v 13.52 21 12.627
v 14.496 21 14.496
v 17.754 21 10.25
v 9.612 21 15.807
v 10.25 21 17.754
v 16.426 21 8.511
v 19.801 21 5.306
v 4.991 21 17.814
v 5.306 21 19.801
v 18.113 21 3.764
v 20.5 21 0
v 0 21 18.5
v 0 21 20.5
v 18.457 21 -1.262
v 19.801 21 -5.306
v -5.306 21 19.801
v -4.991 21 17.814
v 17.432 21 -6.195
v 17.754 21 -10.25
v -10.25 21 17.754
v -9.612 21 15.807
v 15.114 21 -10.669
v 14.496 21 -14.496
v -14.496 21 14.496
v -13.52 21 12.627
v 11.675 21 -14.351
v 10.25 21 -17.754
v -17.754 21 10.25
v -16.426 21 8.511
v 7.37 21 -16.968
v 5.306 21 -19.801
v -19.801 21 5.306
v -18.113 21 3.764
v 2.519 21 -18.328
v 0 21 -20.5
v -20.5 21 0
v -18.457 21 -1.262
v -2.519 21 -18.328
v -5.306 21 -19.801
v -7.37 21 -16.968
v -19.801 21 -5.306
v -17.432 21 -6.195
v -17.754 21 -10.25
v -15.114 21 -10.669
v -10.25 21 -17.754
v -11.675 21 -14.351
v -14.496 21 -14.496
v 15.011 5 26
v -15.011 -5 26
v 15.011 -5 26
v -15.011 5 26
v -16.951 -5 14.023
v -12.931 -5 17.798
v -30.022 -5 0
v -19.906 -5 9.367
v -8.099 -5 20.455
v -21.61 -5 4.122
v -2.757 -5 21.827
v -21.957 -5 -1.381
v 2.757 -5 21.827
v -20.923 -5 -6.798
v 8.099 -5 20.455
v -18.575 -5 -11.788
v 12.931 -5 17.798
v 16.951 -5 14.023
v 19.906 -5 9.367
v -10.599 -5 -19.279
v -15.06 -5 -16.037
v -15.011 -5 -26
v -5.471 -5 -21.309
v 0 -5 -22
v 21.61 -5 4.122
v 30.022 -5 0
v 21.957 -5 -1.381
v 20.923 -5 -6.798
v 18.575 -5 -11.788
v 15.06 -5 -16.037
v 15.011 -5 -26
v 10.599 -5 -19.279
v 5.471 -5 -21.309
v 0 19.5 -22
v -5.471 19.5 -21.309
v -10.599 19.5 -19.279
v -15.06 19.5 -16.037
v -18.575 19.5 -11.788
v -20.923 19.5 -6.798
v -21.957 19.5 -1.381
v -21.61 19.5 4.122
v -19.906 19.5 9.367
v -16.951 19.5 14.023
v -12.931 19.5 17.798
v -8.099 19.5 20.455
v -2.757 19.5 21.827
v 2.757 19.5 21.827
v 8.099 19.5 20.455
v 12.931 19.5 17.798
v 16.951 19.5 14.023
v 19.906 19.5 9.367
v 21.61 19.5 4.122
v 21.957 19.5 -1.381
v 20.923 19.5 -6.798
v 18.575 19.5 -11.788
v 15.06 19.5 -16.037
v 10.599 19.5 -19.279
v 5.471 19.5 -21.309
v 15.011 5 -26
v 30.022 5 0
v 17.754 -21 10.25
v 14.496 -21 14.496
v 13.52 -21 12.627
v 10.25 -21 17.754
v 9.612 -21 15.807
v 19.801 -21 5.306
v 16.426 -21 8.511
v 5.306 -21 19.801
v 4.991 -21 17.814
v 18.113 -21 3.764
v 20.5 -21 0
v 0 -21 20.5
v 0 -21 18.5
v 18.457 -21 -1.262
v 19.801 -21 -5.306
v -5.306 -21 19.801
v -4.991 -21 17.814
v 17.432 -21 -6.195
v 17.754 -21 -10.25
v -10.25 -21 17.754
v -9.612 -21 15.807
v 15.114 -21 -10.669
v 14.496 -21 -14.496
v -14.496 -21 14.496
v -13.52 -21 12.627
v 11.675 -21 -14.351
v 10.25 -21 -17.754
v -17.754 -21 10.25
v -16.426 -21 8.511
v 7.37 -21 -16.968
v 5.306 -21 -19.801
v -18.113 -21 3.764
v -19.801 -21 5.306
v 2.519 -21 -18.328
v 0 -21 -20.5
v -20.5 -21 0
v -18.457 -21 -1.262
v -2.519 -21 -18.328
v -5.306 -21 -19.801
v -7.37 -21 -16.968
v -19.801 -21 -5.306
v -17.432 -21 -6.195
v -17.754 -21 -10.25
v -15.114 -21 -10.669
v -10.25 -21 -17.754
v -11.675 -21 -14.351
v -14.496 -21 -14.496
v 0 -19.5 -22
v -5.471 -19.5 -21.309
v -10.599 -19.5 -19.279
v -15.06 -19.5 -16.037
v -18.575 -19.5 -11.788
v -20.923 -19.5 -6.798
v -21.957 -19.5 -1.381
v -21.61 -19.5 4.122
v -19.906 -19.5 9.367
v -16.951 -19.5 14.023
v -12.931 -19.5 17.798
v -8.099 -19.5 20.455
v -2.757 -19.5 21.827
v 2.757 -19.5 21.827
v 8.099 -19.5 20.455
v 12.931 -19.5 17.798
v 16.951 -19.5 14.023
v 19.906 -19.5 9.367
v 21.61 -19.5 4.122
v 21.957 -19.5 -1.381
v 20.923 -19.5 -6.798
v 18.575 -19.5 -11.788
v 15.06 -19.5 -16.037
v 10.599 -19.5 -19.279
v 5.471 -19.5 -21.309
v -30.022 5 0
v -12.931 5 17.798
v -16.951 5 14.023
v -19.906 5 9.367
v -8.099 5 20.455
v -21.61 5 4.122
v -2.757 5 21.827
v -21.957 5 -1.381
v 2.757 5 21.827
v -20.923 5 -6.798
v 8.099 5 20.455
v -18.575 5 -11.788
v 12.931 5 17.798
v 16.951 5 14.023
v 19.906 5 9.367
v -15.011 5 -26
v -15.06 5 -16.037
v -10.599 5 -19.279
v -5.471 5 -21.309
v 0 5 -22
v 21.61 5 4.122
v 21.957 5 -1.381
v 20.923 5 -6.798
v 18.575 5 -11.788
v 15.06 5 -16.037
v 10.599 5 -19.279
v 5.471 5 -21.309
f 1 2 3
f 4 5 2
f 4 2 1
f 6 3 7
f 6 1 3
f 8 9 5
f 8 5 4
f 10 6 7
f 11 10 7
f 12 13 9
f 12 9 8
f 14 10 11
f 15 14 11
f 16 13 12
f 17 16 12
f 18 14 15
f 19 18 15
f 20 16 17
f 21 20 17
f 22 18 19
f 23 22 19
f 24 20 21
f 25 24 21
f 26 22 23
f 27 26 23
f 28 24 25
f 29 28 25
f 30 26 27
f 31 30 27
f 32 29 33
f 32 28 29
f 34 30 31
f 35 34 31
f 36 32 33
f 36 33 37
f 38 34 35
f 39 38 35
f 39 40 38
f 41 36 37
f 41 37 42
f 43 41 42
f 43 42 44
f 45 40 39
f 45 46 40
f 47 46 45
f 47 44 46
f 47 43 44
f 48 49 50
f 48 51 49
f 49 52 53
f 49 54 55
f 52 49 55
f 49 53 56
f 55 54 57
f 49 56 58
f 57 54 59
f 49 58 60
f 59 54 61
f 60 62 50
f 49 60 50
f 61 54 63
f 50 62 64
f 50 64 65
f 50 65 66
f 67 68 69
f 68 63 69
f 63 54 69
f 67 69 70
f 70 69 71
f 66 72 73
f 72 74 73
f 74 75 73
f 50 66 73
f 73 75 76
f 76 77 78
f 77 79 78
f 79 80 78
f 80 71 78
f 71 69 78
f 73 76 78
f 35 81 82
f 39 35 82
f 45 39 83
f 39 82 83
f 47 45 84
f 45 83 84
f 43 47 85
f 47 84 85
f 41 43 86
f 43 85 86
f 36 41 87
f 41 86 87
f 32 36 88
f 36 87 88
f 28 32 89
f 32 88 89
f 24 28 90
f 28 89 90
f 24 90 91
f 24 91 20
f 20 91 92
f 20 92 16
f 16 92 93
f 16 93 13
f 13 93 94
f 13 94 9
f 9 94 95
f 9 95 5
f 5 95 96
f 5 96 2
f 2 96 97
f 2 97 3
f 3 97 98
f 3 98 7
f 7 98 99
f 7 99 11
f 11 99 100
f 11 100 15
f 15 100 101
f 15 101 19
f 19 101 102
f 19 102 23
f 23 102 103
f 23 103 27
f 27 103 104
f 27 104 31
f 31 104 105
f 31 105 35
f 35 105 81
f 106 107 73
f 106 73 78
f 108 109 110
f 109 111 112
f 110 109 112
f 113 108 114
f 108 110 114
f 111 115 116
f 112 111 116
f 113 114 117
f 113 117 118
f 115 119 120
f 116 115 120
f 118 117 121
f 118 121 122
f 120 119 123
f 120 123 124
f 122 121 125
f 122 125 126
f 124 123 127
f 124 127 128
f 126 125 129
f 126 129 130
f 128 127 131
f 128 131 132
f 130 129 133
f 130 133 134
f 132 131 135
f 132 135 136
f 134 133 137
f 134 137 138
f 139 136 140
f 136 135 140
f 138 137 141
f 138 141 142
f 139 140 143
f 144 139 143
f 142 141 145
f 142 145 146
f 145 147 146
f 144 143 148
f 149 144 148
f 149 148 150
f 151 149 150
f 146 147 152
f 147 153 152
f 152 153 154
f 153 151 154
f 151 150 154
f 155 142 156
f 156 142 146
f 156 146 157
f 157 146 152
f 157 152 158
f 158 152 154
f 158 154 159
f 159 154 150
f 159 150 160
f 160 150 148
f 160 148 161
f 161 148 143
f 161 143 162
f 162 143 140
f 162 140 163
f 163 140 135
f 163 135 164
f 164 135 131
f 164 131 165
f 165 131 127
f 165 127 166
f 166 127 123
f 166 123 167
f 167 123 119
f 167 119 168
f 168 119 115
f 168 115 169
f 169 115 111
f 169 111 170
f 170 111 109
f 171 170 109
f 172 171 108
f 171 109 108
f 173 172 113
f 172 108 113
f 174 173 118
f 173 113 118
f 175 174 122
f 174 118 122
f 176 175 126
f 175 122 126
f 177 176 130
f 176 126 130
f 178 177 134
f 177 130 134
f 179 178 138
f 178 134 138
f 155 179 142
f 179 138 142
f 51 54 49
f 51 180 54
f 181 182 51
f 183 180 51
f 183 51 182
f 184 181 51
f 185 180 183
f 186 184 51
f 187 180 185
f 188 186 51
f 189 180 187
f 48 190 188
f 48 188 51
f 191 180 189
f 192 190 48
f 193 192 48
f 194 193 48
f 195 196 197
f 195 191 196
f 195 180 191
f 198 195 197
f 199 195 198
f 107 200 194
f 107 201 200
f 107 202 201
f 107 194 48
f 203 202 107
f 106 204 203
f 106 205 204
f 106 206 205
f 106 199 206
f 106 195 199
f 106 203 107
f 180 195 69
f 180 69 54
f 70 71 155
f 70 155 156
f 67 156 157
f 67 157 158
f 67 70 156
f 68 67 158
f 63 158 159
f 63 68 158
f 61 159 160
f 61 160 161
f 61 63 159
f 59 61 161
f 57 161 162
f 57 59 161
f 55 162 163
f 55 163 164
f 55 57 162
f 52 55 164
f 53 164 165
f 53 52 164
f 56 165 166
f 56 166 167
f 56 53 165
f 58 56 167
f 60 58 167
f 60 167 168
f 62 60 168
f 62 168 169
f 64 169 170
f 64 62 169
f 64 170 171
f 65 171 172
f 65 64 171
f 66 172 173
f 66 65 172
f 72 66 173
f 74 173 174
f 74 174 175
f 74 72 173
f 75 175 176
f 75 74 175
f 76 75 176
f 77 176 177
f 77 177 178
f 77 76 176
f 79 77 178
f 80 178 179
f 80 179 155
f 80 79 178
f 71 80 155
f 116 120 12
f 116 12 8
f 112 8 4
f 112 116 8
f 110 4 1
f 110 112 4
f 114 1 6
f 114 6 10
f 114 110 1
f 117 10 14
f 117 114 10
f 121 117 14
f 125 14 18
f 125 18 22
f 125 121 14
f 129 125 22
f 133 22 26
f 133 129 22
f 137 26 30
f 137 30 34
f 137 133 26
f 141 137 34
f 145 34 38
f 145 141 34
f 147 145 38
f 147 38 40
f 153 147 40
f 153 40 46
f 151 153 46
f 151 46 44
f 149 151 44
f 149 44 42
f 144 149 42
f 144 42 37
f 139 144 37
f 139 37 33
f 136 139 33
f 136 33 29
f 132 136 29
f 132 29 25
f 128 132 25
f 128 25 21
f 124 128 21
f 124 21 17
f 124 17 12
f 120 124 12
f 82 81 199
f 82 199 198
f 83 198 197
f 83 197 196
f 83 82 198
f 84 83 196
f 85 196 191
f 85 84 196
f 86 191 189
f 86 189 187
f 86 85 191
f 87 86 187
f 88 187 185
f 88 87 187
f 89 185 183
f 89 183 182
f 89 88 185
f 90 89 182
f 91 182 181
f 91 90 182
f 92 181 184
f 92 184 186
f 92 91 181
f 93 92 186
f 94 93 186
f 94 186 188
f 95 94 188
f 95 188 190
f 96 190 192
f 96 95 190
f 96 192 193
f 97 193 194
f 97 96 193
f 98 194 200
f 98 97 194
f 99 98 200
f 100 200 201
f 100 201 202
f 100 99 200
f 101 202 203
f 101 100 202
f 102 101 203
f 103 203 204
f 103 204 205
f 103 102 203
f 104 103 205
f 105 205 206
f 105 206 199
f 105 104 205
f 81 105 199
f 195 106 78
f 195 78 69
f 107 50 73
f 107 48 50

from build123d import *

# Parameters (mm, degrees)
SKETCH1_R           = 18.5
BOSS_EXTRUDE1_DEPTH = 5
SKETCH2_R           = 22
SKETCH2_R_2         = 18.5
BOSS_EXTRUDE2_DEPTH = 21
CHAMFER1_SIZE       = 1.5


with BuildPart() as part:
    # Sketch1 → Boss-Extrude1 (new, symmetric)
    with BuildSketch(Plane(origin=(0, 0, 0), x_dir=(1, 0, 0), z_dir=(0, 1, 0))):
        Polygon((15.011106999, -26), (30.022213998, 0), (15.011106999, 26), (-15.011106999, 26), (-30.022213998, 0), (-15.011106999, -26), align=None)
        with Locations(Location((0, 0, 0), (0, 0, 270))):
            Circle(SKETCH1_R, mode=Mode.SUBTRACT)
    extrude(amount=BOSS_EXTRUDE1_DEPTH, both=True)

    # Sketch2 → Boss-Extrude2 (add, symmetric)
    with BuildSketch(Plane(origin=(0, 0, 0), x_dir=(1, 0, 0), z_dir=(0, 1, 0))):
        with Locations(Location((0, 0, 0), (0, 0, 90))):
            Circle(SKETCH2_R)
        with Locations(Location((0, 0, 0), (0, 0, 270))):
            Circle(SKETCH2_R_2, mode=Mode.SUBTRACT)
    extrude(amount=BOSS_EXTRUDE2_DEPTH, both=True)

    # Chamfer1
    chamfer1_edges = [part.edges().sort_by_distance(p)[0] for p in [
        (0, -21, 22),
        (0, 21, 22),
    ]]
    chamfer(chamfer1_edges, length=CHAMFER1_SIZE)


solid = part.part
